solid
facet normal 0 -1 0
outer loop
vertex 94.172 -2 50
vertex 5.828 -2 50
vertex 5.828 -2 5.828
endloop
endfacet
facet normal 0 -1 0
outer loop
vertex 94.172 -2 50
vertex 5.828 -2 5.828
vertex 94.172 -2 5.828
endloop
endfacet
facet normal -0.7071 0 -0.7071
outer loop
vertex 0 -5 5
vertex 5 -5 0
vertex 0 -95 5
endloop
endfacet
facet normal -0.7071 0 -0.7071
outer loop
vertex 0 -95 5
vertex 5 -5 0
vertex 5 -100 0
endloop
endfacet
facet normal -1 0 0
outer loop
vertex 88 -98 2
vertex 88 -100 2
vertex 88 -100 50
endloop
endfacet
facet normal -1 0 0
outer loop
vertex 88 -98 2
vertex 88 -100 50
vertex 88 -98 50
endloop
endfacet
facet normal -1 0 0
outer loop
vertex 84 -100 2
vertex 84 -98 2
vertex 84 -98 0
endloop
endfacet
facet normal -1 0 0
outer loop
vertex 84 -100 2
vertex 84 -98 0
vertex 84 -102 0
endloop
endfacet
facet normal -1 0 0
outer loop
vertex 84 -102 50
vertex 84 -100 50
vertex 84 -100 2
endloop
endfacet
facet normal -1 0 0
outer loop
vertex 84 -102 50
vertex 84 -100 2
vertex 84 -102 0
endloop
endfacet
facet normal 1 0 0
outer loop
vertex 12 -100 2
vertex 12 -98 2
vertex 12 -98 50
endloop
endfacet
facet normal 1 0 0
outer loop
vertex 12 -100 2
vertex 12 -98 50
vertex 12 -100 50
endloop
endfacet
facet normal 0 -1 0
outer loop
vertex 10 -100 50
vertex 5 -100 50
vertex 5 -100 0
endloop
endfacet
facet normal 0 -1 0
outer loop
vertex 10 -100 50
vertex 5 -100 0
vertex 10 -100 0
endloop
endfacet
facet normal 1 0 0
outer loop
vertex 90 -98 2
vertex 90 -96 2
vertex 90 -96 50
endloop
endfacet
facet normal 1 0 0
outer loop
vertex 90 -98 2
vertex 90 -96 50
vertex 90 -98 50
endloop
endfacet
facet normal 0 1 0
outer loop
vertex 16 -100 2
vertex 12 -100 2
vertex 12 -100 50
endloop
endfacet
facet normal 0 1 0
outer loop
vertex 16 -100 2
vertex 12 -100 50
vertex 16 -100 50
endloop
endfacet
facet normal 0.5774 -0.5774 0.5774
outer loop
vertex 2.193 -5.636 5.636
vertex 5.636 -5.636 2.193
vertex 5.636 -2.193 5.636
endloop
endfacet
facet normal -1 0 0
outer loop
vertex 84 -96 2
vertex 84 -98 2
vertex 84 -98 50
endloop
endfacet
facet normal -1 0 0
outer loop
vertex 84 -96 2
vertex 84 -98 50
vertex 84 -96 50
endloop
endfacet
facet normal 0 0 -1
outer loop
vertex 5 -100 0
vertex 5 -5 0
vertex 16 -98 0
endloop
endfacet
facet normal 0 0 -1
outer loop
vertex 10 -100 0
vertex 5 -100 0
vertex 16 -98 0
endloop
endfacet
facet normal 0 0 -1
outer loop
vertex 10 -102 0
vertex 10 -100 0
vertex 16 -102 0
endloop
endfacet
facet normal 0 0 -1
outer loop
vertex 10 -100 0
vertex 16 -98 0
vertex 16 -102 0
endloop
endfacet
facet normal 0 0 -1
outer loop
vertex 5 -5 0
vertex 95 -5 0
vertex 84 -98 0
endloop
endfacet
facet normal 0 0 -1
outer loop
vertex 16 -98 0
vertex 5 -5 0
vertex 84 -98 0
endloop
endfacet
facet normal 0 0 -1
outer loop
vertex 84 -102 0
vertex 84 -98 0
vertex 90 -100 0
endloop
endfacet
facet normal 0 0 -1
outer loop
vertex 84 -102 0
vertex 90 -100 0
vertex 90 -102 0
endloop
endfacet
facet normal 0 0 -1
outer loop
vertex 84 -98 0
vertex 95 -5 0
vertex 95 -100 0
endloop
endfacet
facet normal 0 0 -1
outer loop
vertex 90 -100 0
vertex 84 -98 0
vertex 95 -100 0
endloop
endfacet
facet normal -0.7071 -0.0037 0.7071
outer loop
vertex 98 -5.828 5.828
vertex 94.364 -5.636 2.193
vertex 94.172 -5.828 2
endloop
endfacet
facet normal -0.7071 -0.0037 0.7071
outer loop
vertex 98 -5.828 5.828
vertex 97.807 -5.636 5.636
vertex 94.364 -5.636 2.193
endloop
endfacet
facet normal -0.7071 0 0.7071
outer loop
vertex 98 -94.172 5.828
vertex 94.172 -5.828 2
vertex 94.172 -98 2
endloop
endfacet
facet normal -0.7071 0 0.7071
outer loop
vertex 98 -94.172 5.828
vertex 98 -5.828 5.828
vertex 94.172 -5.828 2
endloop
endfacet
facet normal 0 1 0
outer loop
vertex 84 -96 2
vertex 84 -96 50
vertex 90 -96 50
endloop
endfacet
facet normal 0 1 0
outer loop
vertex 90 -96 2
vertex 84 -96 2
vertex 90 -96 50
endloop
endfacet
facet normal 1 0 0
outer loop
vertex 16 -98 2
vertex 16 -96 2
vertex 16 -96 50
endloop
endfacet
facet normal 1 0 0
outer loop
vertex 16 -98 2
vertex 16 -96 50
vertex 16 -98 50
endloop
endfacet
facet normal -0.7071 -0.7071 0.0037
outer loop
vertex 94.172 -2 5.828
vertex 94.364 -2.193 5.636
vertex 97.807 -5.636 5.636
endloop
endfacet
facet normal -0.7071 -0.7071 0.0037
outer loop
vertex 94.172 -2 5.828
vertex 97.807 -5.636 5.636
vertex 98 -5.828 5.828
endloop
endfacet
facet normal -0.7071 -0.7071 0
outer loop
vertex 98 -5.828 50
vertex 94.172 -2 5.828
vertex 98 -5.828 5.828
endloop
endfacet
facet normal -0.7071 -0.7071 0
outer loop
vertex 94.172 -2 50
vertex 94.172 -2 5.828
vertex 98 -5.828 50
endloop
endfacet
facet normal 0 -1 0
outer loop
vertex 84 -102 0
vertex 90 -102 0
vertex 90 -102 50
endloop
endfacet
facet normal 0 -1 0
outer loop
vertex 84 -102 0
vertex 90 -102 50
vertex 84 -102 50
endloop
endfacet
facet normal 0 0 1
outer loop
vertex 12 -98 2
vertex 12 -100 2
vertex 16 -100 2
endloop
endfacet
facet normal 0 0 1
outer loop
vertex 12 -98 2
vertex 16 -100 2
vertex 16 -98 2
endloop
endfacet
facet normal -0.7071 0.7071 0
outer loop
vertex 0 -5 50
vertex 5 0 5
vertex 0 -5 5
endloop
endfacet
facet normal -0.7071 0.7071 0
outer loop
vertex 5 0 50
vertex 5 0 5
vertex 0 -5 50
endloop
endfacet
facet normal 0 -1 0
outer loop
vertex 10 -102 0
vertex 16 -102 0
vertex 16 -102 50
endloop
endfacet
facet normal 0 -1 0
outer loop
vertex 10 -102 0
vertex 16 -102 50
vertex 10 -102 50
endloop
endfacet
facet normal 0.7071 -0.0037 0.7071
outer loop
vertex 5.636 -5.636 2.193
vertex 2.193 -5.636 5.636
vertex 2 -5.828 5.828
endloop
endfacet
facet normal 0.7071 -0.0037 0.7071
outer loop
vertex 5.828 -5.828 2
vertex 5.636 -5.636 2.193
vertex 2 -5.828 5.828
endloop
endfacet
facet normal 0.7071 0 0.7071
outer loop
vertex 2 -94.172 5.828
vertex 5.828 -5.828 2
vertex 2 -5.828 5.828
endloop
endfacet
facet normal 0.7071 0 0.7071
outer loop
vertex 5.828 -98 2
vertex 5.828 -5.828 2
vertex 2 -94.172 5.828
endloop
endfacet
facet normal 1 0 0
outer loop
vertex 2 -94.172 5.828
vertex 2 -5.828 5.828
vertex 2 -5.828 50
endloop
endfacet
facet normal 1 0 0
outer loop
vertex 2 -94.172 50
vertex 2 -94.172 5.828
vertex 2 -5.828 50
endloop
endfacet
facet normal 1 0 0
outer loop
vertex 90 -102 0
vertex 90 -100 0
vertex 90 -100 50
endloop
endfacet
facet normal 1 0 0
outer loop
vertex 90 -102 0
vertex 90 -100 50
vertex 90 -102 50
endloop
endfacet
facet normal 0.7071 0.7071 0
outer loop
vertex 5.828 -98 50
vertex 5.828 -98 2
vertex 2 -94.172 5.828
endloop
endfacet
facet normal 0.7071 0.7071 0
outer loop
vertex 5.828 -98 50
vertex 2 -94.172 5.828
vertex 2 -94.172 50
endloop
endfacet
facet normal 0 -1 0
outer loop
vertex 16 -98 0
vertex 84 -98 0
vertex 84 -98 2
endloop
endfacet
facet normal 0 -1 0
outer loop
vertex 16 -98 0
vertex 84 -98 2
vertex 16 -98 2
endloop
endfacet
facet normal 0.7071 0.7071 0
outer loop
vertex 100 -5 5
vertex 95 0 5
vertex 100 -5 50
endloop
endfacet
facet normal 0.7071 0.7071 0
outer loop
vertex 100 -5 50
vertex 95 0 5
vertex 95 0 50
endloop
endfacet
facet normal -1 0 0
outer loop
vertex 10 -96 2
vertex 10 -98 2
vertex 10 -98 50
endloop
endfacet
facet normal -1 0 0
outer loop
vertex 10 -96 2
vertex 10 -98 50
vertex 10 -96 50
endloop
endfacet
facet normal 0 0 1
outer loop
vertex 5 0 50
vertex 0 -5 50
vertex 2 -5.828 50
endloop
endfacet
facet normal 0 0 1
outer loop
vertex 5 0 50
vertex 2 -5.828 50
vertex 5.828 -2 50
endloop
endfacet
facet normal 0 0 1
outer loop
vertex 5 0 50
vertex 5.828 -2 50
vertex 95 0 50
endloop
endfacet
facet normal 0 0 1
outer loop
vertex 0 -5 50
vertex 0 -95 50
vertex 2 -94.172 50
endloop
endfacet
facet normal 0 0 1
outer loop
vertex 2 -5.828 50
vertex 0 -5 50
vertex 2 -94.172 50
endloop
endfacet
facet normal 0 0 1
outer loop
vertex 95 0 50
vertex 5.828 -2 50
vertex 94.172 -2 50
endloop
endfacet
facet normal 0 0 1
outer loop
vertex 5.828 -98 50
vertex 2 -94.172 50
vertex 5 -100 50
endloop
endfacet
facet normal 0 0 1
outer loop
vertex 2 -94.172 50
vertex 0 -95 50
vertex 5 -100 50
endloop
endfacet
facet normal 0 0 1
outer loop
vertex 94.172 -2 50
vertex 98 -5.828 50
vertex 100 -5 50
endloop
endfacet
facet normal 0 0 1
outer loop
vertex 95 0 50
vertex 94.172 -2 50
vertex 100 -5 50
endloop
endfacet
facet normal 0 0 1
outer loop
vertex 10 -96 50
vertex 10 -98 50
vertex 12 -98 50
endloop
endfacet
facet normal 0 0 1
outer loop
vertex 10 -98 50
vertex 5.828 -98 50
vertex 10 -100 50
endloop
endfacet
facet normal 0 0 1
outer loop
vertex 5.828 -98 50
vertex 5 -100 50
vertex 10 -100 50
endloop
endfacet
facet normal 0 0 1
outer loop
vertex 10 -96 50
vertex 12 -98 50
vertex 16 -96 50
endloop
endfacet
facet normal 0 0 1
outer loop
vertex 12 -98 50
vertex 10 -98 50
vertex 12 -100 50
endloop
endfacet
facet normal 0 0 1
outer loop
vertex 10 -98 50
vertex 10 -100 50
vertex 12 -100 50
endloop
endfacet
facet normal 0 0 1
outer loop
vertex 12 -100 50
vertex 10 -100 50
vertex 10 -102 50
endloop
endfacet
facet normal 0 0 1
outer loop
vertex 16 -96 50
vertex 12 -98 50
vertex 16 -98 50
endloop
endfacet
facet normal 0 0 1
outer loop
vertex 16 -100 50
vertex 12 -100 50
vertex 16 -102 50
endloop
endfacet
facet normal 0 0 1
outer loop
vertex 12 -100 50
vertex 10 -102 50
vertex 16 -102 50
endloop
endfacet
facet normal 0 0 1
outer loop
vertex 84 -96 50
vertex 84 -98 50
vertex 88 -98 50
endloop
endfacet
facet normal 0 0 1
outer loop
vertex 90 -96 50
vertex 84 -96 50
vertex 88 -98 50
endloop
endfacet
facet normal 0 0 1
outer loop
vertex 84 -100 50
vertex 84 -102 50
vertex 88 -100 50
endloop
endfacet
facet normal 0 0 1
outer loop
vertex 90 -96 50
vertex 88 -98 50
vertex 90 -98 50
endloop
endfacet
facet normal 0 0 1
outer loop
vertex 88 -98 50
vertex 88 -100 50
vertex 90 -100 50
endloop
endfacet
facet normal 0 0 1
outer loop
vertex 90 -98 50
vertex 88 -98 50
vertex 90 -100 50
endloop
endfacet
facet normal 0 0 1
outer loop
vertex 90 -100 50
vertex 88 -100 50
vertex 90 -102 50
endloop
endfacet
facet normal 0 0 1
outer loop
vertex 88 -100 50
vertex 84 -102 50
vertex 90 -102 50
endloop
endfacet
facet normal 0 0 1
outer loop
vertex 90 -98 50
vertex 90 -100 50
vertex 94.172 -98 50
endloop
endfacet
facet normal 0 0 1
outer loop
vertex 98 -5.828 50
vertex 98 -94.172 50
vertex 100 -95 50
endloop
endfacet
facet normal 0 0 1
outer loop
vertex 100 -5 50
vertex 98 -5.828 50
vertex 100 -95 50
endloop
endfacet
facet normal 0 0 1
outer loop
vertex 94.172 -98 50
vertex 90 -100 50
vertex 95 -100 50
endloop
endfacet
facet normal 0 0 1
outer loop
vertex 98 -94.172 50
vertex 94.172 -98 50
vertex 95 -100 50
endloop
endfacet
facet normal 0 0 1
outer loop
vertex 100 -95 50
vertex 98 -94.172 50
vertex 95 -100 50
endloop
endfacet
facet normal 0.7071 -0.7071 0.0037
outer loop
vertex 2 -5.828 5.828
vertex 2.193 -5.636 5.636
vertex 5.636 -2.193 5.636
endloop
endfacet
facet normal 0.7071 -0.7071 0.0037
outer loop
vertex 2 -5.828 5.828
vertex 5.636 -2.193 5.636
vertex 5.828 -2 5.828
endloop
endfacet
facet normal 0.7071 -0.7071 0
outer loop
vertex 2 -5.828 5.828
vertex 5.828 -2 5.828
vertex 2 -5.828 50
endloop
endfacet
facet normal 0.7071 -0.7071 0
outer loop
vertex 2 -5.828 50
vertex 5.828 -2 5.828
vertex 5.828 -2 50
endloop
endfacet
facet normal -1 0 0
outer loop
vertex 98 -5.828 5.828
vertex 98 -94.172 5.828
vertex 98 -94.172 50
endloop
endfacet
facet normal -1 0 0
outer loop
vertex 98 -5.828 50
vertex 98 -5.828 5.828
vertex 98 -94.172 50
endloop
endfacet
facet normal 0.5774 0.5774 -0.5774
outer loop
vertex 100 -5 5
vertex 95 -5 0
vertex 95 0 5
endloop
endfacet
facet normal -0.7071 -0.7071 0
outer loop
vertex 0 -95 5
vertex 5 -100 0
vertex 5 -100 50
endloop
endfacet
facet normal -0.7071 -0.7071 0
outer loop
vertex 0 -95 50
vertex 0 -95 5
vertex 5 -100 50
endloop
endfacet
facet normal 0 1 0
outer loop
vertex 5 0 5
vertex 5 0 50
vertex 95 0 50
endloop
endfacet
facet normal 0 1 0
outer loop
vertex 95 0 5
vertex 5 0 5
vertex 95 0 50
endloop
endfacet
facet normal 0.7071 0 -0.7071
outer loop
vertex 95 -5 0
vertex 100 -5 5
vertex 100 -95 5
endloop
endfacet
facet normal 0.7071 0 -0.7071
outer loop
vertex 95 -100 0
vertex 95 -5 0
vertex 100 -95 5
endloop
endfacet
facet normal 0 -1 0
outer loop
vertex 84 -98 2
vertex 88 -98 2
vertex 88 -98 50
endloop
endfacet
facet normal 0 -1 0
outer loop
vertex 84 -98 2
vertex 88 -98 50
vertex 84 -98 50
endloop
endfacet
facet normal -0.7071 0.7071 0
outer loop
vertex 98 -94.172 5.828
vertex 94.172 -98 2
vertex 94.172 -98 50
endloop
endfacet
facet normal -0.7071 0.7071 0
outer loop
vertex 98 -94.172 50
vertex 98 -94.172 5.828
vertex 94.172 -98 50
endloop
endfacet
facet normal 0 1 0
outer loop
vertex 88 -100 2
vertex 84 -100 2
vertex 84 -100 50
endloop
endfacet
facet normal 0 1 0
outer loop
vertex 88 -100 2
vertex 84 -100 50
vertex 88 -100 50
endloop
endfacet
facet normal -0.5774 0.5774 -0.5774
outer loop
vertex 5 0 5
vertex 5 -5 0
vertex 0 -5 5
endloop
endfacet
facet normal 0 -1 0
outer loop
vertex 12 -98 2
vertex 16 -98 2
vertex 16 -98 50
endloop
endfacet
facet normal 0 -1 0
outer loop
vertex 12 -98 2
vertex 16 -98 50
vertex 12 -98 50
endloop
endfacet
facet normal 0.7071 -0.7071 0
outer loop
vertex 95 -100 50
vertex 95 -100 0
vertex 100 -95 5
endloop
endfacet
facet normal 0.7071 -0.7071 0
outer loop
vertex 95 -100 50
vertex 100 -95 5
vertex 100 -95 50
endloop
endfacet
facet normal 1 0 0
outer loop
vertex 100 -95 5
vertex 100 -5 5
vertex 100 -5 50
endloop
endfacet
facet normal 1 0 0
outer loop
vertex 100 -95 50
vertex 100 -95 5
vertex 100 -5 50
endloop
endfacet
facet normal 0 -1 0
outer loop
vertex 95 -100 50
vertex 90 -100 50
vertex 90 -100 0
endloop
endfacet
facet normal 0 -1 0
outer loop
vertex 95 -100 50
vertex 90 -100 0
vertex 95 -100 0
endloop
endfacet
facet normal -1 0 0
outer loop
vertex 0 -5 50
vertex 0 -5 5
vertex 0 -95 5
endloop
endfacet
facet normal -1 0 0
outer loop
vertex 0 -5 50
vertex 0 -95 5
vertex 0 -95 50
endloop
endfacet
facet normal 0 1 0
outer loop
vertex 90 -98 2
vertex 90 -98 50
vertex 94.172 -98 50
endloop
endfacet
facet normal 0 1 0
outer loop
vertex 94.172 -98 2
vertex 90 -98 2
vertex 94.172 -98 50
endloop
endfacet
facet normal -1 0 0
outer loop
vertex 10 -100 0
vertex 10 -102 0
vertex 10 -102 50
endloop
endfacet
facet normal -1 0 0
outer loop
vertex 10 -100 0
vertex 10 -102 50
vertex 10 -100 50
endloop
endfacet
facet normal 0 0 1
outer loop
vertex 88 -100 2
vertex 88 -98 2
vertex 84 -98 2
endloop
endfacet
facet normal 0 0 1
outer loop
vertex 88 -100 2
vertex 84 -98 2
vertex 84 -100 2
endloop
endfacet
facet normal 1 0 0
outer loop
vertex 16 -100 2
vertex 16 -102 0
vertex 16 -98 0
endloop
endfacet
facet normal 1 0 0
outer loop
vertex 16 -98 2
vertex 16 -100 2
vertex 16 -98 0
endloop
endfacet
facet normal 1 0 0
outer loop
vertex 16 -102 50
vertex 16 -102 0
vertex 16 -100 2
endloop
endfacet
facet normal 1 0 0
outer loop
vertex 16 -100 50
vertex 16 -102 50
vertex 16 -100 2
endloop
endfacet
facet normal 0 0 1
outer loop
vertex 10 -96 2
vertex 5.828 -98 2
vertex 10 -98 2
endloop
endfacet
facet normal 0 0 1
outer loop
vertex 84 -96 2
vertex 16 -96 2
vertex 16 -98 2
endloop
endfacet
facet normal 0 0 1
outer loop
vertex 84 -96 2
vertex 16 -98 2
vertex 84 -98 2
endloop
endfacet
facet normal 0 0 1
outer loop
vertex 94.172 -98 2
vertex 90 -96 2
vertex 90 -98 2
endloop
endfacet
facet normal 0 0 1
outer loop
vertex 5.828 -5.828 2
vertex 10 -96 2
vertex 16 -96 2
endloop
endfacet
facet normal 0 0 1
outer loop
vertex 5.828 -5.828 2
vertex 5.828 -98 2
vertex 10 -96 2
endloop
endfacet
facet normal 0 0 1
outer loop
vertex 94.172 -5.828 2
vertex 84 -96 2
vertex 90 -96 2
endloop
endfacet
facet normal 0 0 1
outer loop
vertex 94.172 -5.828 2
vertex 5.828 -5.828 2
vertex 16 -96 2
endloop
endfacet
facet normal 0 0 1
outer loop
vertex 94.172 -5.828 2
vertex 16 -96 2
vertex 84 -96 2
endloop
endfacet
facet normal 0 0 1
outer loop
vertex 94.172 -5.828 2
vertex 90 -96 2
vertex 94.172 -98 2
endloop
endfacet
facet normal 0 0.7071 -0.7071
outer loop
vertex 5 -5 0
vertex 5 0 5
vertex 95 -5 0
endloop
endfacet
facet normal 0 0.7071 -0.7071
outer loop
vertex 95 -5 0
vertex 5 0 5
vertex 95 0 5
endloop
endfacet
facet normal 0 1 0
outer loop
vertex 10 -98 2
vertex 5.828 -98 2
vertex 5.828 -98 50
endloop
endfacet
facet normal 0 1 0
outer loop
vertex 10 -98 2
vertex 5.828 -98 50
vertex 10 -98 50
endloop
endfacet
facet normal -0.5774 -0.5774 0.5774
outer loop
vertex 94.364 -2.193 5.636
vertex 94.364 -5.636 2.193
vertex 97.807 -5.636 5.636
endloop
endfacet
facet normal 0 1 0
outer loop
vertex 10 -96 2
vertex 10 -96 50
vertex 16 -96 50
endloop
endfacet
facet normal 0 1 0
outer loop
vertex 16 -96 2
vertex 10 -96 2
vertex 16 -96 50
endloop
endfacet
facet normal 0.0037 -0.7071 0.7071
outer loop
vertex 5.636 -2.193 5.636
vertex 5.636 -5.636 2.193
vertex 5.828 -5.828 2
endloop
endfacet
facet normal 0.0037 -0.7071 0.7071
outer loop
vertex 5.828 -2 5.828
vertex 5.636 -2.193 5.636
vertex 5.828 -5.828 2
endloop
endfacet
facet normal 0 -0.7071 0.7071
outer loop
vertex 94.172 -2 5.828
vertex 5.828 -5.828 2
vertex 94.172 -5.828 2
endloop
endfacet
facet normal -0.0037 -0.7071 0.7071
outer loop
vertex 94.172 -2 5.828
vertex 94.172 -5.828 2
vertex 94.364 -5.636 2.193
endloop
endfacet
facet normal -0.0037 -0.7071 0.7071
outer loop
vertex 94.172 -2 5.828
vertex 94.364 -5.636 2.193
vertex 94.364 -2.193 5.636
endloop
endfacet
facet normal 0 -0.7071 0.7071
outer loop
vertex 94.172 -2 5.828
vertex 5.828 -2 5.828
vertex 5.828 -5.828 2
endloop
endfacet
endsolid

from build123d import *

# Parameters (mm, degrees)
F0_W      = 100
F0_H      = 50
F1_DEPTH  = 100
F2_SIZE   = 5
F3_T      = -2
F4_W      = 80
F4_H      = 2
F5_DEPTH  = 50
F7_DEPTH  = 50
F8_W      = 2
F8_H      = 2
F9_DEPTH  = 4
F11_DEPTH = 50
F12_W     = 2
F12_H     = 2
F13_DEPTH = 4


with BuildPart() as f1:
    # F0 (on Front) → F1 (new body)
    with BuildSketch(Plane.XZ):
        with Locations((50, 25)):
            Rectangle(F0_W, F0_H)
    extrude(amount=F1_DEPTH)

    # F2
    f2_edges = [f1.edges().sort_by_distance(p)[0] for p in [
        (50, 0, 0),
        (0, -50, 0),
        (100, -50, 0),
        (0, -100, 25),
        (100, -100, 25),
        (100, 0, 25),
        (0, 0, 25),
    ]]
    chamfer(f2_edges, length=F2_SIZE)

    # F3
    f3_openings = [f1.faces().sort_by_distance(p)[0] for p in [
        (50, -50, 50),
    ]]
    offset(amount=F3_T, openings=f3_openings)

    # F4 (on face) → F5 (cut)
    with BuildSketch(Plane.XY.offset(50)):
        with Locations((50, -99)):
            Rectangle(F4_W, F4_H)
    extrude(amount=-F5_DEPTH, mode=Mode.SUBTRACT)

    # F6 (on face) → F7 (join)
    with BuildSketch(Plane(origin=(0, 0, 0), x_dir=(1, 0, 0), z_dir=(0, 0, -1))):
        Polygon((16, 102), (10, 102), (10, 100), (10, 98), (12, 98), (12, 100), (16, 100), align=None)
        Polygon((12, 98), (10, 98), (10, 96), (16, 96), (16, 98), align=None)
    extrude(amount=-F7_DEPTH)

    # F8 (on face) → F9 (join)
    with BuildSketch(Plane.YZ.offset(12)):
        with Locations((-99, 1)):
            Rectangle(F8_W, F8_H)
    extrude(amount=F9_DEPTH)

    # F10 (on face) → F11 (join)
    with BuildSketch(Plane(origin=(0, 0, 0), x_dir=(1, 0, 0), z_dir=(0, 0, -1))):
        Polygon((90, 100), (90, 102), (84, 102), (84, 100), (88, 100), (88, 98), (90, 98), align=None)
        Polygon((90, 96), (90, 98), (88, 98), (84, 98), (84, 96), align=None)
    extrude(amount=-F11_DEPTH)

    # F12 (on face) → F13 (join)
    with BuildSketch(Plane(origin=(88, 0, 0), x_dir=(0, -1, 0), z_dir=(-1, 0, 0))):
        with Locations((99, 1)):
            Rectangle(F12_W, F12_H)
    extrude(amount=F13_DEPTH)


solid = f1.part
